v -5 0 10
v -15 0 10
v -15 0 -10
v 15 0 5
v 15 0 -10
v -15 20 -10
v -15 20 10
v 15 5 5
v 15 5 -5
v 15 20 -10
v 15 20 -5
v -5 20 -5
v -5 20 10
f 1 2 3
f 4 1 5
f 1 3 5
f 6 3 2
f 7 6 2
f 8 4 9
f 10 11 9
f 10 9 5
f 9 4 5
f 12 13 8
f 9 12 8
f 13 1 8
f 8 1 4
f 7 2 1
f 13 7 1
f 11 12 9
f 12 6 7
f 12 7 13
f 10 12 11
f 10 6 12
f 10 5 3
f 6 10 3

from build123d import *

# Parameters (mm, degrees)
EXTRUDE_1_DEPTH     = 20
EXTRUDE_2_DEPTH     = 20
CUT_EXTRUDE_1_DEPTH = 15


with BuildPart() as part:
    # 草圖1 → 填料-伸長1 (new body)
    with BuildSketch(Plane(origin=(0, 0, 0), x_dir=(1, 0, 0), z_dir=(0, 1, 0))):
        Polygon((-5, 5), (-5, -10), (15, -5), (15, 5), align=None)
    extrude(amount=EXTRUDE_1_DEPTH)

    # 草圖1<3> → 填料-伸長2 (add)
    with BuildSketch(Plane(origin=(0, 0, 0), x_dir=(1, 0, 0), z_dir=(0, 1, 0))):
        Polygon((-15, -10), (-5, -10), (-5, 5), (15, 5), (15, 10), (-15, 10), align=None)
    extrude(amount=EXTRUDE_2_DEPTH)

    # 草圖2 → 除料-伸長1 (cut)
    with BuildSketch(Plane.XY.offset(10)):
        Polygon((-5, 20), (15, 5), (15, 20), align=None)
    extrude(amount=-CUT_EXTRUDE_1_DEPTH, mode=Mode.SUBTRACT)


solid = part.part
